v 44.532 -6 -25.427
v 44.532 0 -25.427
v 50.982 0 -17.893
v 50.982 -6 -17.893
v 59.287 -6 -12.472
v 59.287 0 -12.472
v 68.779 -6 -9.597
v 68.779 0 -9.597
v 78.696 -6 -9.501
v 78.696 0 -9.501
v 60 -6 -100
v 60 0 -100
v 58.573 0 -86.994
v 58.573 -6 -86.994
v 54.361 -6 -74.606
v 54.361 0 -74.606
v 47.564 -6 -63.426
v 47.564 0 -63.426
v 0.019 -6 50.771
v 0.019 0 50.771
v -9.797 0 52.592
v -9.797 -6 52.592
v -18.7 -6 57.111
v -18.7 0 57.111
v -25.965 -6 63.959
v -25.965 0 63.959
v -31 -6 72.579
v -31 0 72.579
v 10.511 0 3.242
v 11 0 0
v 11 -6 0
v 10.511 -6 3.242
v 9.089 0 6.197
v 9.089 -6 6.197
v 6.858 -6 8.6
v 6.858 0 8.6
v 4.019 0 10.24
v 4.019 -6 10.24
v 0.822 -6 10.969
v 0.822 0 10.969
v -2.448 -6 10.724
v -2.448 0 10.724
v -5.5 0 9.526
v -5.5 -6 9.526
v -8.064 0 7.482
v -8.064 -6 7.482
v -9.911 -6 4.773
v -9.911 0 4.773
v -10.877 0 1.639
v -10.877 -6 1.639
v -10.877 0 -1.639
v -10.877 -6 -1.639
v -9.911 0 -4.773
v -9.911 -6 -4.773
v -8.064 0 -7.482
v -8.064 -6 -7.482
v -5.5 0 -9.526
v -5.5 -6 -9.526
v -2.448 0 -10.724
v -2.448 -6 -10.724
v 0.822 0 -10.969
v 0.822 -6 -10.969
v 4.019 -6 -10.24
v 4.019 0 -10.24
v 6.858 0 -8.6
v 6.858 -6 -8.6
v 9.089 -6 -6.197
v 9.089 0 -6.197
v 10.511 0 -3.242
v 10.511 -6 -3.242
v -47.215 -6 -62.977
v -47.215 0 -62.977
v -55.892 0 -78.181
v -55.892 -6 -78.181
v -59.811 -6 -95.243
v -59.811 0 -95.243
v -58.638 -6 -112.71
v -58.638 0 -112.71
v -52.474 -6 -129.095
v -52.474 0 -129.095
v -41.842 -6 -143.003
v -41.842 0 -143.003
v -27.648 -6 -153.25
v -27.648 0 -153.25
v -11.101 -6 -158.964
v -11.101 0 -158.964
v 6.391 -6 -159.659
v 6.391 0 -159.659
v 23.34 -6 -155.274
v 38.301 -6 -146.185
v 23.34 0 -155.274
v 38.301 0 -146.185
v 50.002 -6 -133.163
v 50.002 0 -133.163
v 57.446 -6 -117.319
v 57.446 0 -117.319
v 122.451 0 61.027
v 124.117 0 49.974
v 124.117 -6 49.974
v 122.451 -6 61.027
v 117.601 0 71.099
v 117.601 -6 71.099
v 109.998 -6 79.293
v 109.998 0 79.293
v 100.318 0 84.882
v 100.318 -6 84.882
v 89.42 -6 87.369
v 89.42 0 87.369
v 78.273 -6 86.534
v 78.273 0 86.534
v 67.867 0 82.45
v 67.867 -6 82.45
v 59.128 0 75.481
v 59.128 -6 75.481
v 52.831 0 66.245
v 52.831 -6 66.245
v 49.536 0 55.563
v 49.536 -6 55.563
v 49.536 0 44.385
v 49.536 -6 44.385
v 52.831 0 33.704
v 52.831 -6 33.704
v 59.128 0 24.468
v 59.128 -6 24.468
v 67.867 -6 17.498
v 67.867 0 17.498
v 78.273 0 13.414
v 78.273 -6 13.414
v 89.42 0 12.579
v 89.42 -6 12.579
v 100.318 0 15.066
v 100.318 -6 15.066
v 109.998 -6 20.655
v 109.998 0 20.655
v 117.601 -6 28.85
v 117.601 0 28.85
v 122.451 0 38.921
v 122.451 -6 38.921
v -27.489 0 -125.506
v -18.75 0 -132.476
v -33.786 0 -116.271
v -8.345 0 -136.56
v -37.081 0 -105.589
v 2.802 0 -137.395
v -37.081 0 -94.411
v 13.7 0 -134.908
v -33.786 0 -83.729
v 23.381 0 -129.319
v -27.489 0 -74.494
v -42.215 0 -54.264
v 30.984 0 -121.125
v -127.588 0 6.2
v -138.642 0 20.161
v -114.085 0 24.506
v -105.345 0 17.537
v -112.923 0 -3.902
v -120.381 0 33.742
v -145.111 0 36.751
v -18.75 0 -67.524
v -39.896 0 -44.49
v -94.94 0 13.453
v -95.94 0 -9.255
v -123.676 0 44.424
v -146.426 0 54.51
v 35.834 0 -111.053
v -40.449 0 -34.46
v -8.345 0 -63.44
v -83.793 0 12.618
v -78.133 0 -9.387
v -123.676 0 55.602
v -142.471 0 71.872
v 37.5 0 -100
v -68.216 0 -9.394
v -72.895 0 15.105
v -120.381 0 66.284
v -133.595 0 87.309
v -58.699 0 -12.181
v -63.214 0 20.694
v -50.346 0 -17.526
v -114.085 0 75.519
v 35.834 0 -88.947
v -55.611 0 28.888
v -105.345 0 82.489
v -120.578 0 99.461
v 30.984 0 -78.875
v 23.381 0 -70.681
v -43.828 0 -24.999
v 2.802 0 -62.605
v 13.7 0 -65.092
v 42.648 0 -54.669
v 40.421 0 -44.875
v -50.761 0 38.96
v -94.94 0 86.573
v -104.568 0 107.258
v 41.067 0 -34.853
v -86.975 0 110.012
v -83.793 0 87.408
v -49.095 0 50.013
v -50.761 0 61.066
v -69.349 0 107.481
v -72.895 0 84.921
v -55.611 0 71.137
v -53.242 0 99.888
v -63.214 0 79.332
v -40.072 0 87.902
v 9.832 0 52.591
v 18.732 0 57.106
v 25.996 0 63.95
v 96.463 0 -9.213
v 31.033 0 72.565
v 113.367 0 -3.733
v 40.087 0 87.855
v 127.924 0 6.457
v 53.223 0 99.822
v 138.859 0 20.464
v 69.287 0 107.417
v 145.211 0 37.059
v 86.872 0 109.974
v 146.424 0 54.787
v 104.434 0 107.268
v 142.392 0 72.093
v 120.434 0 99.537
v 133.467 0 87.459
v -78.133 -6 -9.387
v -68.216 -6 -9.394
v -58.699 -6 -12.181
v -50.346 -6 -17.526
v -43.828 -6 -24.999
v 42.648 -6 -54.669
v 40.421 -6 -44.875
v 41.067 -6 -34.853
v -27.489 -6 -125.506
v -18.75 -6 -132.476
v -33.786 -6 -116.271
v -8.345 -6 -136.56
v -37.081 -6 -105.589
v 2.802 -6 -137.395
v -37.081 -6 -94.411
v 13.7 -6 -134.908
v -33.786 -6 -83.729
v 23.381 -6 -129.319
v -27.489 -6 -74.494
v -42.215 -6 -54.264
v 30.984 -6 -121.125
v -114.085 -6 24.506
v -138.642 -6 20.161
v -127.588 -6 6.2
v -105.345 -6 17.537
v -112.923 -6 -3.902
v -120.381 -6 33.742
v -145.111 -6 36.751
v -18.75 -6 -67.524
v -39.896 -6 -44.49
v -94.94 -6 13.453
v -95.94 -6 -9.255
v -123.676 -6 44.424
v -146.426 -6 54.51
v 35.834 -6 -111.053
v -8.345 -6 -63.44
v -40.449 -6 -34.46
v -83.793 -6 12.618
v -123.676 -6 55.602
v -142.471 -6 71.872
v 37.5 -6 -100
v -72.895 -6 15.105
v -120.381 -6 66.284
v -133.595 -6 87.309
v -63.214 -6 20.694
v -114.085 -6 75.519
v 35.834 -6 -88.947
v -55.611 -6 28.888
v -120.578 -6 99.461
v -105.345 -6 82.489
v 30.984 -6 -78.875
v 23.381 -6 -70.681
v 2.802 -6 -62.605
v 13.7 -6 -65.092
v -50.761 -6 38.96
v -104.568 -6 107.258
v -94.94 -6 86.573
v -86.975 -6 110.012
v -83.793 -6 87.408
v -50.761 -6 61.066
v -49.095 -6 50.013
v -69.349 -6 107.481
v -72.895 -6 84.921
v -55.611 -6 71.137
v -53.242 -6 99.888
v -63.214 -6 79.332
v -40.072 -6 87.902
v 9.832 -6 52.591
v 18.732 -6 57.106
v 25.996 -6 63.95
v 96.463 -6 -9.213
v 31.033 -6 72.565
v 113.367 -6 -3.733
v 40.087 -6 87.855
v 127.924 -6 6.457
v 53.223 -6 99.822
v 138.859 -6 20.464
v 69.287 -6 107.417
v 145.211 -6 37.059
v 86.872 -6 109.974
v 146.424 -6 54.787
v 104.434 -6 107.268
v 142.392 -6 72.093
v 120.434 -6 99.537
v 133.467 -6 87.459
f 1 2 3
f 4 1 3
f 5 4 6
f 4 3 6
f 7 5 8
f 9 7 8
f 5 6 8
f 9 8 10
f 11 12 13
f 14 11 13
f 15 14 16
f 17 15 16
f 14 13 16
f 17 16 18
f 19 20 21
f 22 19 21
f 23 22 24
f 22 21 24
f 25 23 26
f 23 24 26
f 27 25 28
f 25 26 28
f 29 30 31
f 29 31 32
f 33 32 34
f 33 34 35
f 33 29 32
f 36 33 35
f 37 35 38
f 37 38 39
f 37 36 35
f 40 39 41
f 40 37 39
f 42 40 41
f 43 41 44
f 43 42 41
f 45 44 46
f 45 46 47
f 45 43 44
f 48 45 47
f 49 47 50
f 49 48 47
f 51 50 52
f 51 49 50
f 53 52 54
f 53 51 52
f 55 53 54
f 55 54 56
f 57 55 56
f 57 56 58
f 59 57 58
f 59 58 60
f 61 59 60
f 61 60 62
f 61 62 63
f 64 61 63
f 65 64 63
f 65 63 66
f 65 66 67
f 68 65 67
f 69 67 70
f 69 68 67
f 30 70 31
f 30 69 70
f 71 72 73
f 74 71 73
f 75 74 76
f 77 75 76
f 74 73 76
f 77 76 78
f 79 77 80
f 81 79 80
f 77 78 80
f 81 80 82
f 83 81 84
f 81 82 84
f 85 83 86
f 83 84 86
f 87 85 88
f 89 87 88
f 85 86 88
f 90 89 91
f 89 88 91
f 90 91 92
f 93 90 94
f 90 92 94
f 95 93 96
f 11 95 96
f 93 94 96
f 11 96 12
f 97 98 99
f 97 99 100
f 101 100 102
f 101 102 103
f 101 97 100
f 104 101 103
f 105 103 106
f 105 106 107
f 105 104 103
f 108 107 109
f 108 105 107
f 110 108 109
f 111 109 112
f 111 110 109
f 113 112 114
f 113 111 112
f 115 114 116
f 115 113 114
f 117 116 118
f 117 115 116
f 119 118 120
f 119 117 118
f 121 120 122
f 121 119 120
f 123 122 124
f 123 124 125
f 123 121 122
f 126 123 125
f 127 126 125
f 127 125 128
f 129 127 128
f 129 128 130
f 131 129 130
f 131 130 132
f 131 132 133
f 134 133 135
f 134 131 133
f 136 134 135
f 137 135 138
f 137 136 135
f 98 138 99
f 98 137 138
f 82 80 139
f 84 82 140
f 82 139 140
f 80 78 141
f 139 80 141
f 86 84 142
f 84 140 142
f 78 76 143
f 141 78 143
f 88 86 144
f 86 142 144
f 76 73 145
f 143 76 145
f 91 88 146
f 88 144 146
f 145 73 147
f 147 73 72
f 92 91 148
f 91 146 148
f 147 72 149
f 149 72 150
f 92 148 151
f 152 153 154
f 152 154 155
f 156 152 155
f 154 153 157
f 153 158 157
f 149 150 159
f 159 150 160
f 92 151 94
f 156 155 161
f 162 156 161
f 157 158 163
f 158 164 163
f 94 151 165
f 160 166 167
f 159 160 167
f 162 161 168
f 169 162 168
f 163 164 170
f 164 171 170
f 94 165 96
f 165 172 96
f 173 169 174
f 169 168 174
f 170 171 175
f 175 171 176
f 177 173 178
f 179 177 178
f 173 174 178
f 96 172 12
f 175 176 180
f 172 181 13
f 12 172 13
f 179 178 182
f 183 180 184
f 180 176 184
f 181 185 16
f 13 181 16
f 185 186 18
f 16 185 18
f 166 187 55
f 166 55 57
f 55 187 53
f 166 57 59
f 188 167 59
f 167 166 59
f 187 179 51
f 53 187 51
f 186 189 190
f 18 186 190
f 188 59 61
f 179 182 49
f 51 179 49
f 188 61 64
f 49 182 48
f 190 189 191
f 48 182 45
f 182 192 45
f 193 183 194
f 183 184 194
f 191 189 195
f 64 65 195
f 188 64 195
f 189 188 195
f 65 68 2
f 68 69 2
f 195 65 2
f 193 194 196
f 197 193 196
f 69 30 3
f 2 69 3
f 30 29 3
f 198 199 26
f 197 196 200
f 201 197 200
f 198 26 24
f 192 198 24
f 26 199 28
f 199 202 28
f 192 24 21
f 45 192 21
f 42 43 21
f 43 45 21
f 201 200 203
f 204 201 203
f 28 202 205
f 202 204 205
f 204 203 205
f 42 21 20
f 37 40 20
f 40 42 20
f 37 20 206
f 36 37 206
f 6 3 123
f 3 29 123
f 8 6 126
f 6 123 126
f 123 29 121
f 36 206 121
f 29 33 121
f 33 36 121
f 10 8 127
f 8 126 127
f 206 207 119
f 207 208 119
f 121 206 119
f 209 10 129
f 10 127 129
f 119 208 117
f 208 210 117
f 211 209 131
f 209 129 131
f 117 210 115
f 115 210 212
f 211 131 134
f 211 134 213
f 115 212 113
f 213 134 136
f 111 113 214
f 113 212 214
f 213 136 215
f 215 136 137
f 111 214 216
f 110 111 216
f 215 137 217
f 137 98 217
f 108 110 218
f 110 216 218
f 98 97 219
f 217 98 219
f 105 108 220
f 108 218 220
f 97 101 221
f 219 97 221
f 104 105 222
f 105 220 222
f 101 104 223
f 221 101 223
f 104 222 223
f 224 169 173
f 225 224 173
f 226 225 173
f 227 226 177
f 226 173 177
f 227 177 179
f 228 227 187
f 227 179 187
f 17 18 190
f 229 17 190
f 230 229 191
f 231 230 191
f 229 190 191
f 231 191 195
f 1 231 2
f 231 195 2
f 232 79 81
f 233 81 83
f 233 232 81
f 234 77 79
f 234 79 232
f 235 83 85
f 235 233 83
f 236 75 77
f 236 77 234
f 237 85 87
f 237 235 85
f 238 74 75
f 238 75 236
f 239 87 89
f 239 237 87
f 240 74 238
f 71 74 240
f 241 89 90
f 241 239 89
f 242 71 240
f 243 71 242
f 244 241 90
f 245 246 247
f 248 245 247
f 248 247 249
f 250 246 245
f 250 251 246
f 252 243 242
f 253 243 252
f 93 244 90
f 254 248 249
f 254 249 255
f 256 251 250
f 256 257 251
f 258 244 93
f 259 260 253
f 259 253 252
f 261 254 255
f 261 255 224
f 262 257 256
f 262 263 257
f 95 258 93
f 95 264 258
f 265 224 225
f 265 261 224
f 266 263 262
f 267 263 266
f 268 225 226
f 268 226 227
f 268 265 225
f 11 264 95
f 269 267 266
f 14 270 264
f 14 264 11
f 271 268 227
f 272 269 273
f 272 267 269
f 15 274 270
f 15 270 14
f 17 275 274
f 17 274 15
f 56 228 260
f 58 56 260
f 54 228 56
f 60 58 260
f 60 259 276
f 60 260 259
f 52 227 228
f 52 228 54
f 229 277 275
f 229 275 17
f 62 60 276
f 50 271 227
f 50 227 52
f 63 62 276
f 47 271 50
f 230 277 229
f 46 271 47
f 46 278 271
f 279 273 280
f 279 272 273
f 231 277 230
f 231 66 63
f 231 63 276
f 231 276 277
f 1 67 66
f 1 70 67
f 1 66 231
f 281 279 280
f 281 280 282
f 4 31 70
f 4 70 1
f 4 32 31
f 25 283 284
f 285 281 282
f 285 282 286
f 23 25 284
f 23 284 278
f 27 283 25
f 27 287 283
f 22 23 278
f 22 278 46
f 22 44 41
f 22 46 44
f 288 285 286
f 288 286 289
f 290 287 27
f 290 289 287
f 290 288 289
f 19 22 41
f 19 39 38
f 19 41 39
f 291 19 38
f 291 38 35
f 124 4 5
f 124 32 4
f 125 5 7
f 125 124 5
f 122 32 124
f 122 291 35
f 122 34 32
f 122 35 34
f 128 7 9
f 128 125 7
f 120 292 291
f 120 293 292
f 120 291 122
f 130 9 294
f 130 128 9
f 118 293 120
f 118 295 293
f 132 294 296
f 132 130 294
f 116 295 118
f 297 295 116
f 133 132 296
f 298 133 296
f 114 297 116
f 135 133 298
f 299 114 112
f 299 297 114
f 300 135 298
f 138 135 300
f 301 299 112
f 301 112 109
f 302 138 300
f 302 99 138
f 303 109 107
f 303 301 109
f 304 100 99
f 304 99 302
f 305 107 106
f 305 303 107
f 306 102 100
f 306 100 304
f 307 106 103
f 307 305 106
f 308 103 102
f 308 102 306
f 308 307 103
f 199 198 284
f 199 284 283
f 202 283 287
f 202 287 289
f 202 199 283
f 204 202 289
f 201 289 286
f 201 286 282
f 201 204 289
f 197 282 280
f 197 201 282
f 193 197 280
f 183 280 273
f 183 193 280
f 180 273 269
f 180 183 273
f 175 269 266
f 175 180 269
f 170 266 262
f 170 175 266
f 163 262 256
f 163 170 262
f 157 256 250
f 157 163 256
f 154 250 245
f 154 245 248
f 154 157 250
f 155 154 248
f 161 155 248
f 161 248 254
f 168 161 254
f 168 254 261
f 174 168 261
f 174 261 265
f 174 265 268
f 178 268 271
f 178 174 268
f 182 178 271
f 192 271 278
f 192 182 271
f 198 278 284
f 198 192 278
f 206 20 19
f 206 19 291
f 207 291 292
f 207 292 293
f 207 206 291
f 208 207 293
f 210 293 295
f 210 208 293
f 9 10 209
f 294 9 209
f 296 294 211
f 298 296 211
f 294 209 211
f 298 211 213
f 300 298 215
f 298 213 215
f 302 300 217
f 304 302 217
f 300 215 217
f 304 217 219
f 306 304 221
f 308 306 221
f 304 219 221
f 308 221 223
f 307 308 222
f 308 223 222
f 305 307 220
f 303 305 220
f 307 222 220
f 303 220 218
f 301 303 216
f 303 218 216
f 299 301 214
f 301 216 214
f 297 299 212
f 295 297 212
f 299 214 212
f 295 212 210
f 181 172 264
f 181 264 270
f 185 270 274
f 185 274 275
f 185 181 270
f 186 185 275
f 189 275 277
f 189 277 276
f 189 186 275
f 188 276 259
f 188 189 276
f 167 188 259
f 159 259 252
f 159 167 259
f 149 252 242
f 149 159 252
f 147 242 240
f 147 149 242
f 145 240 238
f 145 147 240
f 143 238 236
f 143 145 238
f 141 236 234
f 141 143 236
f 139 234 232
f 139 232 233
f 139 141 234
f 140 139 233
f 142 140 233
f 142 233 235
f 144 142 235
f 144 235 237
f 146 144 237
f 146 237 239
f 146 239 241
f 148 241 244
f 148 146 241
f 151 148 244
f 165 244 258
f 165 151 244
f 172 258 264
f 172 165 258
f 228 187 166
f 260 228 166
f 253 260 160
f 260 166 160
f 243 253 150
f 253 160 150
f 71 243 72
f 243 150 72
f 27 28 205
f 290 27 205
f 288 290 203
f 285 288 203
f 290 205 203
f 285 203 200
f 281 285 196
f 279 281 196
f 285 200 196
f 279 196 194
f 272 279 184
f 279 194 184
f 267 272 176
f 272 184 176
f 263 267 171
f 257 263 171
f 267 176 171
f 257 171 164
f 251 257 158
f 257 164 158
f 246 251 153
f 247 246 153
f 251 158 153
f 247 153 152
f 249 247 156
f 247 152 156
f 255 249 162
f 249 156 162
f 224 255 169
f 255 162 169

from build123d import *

# Parameters (mm, degrees)
F0_R        = 37.5
F0_R_2      = 11
F1_DEPTH    = 6
F2_T1_DEPTH = 6


# Not quite as in the source:
# - a fillet or chamfer that OpenCascade refuses, or shapes differently, is made with other operations: its cross-section is extruded or revolved along the edge and cut away or added


with BuildPart() as f1:
    # F0 (on Front) → F1 (new body)
    with BuildSketch(Plane.XZ):
        with BuildLine():
            ThreePointArc((57.8643034804, -2.6875543668), (117.2345315762, -1.6261715812), (146.617452556, 49.9741624513))
            ThreePointArc((146.617452556, 49.9741624513), (87.0017930869, 109.9729314583), (26.6223764775, 50.7428277423))
            ThreePointArc((26.6223764775, 50.7428277423), (34.8220541109, 19.6882465841), (57.8643034804, -2.6875543668))
        make_face()
        with Locations((86.617452556, 49.9741624513)):
            Circle(F0_R, mode=Mode.SUBTRACT)
        with BuildLine():
            ThreePointArc((-26.5950813994, 50.0129171058), (-26.5961913872, 50.3778791758), (-26.5995213098, 50.7428277423))
            ThreePointArc((-26.5995213098, 50.7428277423), (-138.5810142586, 79.97060034), (-57.1442597977, -2.261829254))
            ThreePointArc((-57.1442597977, -2.261829254), (-34.7923339042, 19.7395731883), (-26.5950813994, 50.0129171058))
        make_face()
        with Locations((-86.5950813994, 50.0129171058)):
            Circle(F0_R, mode=Mode.SUBTRACT)
        with BuildLine():
            ThreePointArc((57.8643034804, -2.6875543668), (34.8220541109, 19.6882465841), (26.6223764775, 50.7428277423))
            Line((26.6223764775, 50.7428277423), (-26.5995213098, 50.7428277423))
            ThreePointArc((-26.5995213098, 50.7428277423), (-26.5961913872, 50.3778791758), (-26.5950813994, 50.0129171058))
            ThreePointArc((-26.5950813994, 50.0129171058), (-34.7923339042, 19.7395731883), (-57.1442597977, -2.261829254))
            Line((-57.1442597977, -2.261829254), (-30.1904821111, -48.1489171772))
            ThreePointArc((-30.1904821111, -48.1489171772), (0.418102689, -40.0014567665), (30.9101684744, -48.5746999534))
            Line((30.9101684744, -48.5746999534), (57.8643034804, -2.6875543668))
        make_face()
        Circle(F0_R_2, mode=Mode.SUBTRACT)
        with BuildLine():
            ThreePointArc((60, -100), (52.2236062929, -70.4585893064), (30.9101684744, -48.5746999534))
            ThreePointArc((30.9101684744, -48.5746999534), (0.418102689, -40.0014567665), (-30.1904821111, -48.1489171772))
            ThreePointArc((-30.1904821111, -48.1489171772), (-29.9046072816, -152.0164826121), (60, -100))
        make_face()
        with Locations((0, -100)):
            Circle(F0_R, mode=Mode.SUBTRACT)
    extrude(amount=F1_DEPTH)

    # F2: fillet of radius 35 on 6 edges, made by hand

    # F2_s2 → F2_t1 (join)
    with BuildSketch(Plane.XZ):
        with BuildLine():
            ThreePointArc((-44.5789786986, -23.6534191556), (-39.8361716067, -43.7215717477), (-47.2154351555, -62.9769979192))
            ThreePointArc((-47.2154351555, -62.9769979192), (-39.40668727, -54.7549671411), (-30.1904821111, -48.1489171772))
            Line((-30.1904821111, -48.1489171772), (-44.5789786986, -23.6534191556))
        make_face()
        with BuildLine():
            ThreePointArc((-1.3916525599, 50.7428277423), (18.1502571968, 56.7064064225), (31.0327545881, 72.5648984246))
            ThreePointArc((31.0327545881, 72.5648984246), (27.8065544641, 61.8602158597), (26.6223764775, 50.7428277423))
            Line((26.6223764775, 50.7428277423), (-1.3916525599, 50.7428277423))
        make_face()
        with BuildLine():
            ThreePointArc((1.4297644449, 50.7428277423), (-18.1185373349, 56.7107093642), (-31.0004419188, 72.5791764552))
            ThreePointArc((-31.0004419188, 72.5791764552), (-27.7777362498, 61.8670265011), (-26.5995213098, 50.7428277423))
            Line((-26.5995213098, 50.7428277423), (1.4297644449, 50.7428277423))
        make_face()
        with BuildLine():
            ThreePointArc((43.89611258, -26.4672233966), (58.7364313951, -12.7341703185), (78.6957856647, -9.500598529))
            ThreePointArc((78.6957856647, -9.500598529), (67.9663152116, -7.0533315824), (57.8643034804, -2.6875543668))
            Line((57.8643034804, -2.6875543668), (43.89611258, -26.4672233966))
        make_face()
        with BuildLine():
            ThreePointArc((47.5642084271, -63.4261558392), (40.3776870322, -44.2671300594), (45.1312959448, -24.3644277078))
            Line((45.1312959448, -24.3644277078), (30.9101684744, -48.5746999534))
            ThreePointArc((30.9101684744, -48.5746999534), (39.9336749248, -55.2194059106), (47.5642084271, -63.4261558392))
        make_face()
        with BuildLine():
            ThreePointArc((-78.1330690057, -9.3873720033), (-58.0015888855, -12.5081469238), (-43.0181014785, -26.3107131005))
            Line((-43.0181014785, -26.3107131005), (-57.1442597977, -2.261829254))
            ThreePointArc((-57.1442597977, -2.261829254), (-67.3067666659, -6.8022297719), (-78.1330690057, -9.3873720033))
        make_face()
    extrude(amount=F2_T1_DEPTH)


solid = f1.part
